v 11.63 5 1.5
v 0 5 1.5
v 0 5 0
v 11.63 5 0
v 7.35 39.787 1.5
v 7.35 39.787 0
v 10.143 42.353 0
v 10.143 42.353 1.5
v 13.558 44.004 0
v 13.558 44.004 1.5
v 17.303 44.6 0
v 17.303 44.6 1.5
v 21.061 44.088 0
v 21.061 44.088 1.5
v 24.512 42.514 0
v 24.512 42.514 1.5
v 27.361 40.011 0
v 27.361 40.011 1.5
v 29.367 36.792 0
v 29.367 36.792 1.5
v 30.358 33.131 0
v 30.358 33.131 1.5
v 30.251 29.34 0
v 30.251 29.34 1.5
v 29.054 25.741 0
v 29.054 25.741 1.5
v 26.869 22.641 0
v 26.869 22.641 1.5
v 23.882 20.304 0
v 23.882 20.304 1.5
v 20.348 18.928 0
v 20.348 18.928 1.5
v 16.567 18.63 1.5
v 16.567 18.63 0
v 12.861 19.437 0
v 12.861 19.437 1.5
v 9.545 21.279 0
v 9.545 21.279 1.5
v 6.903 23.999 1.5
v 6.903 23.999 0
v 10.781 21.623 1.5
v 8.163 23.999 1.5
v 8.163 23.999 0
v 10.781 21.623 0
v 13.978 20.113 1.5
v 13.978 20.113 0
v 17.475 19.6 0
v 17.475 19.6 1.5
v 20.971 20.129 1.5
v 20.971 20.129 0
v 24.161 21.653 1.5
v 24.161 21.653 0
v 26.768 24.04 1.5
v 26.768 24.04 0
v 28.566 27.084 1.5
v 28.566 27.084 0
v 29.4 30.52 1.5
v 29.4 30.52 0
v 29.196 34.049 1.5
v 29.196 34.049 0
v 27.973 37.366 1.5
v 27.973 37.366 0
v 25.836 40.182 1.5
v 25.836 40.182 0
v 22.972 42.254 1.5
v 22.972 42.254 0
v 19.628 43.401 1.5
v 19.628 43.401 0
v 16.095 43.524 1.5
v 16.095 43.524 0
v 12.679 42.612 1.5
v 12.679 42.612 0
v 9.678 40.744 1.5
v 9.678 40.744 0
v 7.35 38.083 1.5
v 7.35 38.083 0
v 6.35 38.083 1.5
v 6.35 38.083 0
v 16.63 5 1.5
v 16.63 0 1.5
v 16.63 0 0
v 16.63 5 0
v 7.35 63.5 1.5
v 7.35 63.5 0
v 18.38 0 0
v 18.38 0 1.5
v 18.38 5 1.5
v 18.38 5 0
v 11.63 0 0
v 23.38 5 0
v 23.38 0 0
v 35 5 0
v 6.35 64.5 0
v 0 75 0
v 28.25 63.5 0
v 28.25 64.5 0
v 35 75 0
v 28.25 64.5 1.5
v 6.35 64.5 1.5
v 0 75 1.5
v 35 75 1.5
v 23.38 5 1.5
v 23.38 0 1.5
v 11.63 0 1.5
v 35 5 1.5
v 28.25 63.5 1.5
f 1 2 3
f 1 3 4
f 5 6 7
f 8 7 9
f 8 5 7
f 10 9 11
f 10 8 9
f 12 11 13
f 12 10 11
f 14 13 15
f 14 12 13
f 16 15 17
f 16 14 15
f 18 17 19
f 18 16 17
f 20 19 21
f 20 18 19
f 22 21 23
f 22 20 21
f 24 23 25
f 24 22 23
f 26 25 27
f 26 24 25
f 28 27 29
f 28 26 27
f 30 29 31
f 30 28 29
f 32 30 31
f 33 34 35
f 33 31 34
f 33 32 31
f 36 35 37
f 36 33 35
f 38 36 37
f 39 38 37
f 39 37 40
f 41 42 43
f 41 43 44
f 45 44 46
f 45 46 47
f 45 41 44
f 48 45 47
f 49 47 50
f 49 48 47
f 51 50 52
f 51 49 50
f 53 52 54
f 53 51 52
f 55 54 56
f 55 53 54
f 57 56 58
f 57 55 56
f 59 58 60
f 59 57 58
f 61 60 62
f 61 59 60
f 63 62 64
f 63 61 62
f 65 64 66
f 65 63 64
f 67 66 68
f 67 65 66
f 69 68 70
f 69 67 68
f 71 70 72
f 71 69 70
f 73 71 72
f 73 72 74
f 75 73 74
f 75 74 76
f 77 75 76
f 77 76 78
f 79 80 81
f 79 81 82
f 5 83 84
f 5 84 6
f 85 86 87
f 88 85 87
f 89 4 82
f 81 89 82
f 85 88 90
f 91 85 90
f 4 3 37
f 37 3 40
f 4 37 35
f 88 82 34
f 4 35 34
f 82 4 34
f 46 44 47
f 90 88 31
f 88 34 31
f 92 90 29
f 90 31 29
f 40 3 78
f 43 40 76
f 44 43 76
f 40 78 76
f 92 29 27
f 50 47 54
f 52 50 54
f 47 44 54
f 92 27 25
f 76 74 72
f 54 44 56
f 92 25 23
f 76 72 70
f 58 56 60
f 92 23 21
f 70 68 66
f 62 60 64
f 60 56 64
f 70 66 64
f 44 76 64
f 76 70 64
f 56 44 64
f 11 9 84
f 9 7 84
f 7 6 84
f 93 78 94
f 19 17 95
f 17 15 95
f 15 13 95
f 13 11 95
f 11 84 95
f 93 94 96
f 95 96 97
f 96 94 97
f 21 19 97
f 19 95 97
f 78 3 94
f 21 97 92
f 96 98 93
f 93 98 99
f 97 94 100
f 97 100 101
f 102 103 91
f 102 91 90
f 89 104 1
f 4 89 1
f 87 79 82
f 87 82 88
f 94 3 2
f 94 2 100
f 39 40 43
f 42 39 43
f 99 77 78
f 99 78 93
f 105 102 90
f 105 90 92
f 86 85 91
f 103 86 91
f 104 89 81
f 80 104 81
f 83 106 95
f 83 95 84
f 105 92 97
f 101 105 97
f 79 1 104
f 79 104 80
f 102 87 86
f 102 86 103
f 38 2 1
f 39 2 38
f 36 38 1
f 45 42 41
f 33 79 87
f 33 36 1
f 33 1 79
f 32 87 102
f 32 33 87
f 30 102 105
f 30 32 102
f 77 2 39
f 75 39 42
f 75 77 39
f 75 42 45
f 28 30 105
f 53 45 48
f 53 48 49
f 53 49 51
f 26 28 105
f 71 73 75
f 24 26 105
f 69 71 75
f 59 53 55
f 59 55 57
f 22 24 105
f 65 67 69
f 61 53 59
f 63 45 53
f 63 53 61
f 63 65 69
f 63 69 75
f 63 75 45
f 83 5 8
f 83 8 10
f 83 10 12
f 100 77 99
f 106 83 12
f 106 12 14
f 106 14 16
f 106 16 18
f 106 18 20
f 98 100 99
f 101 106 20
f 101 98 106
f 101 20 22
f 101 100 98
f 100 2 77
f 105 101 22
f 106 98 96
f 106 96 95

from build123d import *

# Parameters (mm, degrees)
SKIZZE1_W                       = 35
SKIZZE1_H                       = 75
AUFSATZ_LINEAR_AUSTRAGEN1_DEPTH = 1.5
SKIZZE2_W                       = 11.63
SKIZZE2_H                       = 5
SKIZZE2_W_2                     = 11.62
SKIZZE2_W_3                     = 1.75
SCHNITT_LINEAR_AUSTRAGEN1_DEPTH = 1.5
SCHNITT_LINEAR_AUSTRAGEN5_DEPTH = 20
SCHNITT_LINEAR_AUSTRAGEN6_DEPTH = 20


with BuildPart() as part:
    # Skizze1 → Aufsatz-Linear austragen1 (new body)
    with BuildSketch(Plane.XY):
        with Locations((17.5, 37.5)):
            Rectangle(SKIZZE1_W, SKIZZE1_H)
    extrude(amount=AUFSATZ_LINEAR_AUSTRAGEN1_DEPTH)

    # Skizze2 → Schnitt-Linear austragen1 (cut)
    with BuildSketch(Plane.XY.offset(1.5)):
        with Locations((5.815, 2.5)):
            Rectangle(SKIZZE2_W, SKIZZE2_H)
        with Locations((29.19, 2.5)):
            Rectangle(SKIZZE2_W_2, SKIZZE2_H)
        with Locations((17.505, 2.5)):
            Rectangle(SKIZZE2_W_3, SKIZZE2_H)
    extrude(amount=-SCHNITT_LINEAR_AUSTRAGEN1_DEPTH, mode=Mode.SUBTRACT)

    # Skizze10 → Schnitt-Linear austragen5 (cut)
    with BuildSketch(Plane.XY.offset(1.5)):
        with BuildLine():
            Line((7.35039959, 38.082998074), (6.35039959, 38.370002144))
            ThreePointArc((6.35039959, 38.370002144), (30.439070096, 32.099486097), (6.902625657, 23.998918129))
            Line((6.902625657, 23.998918129), (8.1632503, 23.998918129))
            ThreePointArc((8.1632503, 23.998918129), (29.428721451, 32.291733198), (7.35039959, 38.082998074))
        make_face()
    extrude(amount=-SCHNITT_LINEAR_AUSTRAGEN5_DEPTH, mode=Mode.SUBTRACT)

    # Skizze11 → Schnitt-Linear austragen6 (cut)
    with BuildSketch(Plane.XY.offset(1.5)):
        Polygon((7.35039959, 38.082998074), (6.35039959, 38.082998074), (6.35039959, 64.5), (7.35039959, 64.5), (28.25, 64.5), (28.25, 63.5), (7.35039959, 63.5), align=None)
    extrude(amount=-SCHNITT_LINEAR_AUSTRAGEN6_DEPTH, mode=Mode.SUBTRACT)


solid = part.part
